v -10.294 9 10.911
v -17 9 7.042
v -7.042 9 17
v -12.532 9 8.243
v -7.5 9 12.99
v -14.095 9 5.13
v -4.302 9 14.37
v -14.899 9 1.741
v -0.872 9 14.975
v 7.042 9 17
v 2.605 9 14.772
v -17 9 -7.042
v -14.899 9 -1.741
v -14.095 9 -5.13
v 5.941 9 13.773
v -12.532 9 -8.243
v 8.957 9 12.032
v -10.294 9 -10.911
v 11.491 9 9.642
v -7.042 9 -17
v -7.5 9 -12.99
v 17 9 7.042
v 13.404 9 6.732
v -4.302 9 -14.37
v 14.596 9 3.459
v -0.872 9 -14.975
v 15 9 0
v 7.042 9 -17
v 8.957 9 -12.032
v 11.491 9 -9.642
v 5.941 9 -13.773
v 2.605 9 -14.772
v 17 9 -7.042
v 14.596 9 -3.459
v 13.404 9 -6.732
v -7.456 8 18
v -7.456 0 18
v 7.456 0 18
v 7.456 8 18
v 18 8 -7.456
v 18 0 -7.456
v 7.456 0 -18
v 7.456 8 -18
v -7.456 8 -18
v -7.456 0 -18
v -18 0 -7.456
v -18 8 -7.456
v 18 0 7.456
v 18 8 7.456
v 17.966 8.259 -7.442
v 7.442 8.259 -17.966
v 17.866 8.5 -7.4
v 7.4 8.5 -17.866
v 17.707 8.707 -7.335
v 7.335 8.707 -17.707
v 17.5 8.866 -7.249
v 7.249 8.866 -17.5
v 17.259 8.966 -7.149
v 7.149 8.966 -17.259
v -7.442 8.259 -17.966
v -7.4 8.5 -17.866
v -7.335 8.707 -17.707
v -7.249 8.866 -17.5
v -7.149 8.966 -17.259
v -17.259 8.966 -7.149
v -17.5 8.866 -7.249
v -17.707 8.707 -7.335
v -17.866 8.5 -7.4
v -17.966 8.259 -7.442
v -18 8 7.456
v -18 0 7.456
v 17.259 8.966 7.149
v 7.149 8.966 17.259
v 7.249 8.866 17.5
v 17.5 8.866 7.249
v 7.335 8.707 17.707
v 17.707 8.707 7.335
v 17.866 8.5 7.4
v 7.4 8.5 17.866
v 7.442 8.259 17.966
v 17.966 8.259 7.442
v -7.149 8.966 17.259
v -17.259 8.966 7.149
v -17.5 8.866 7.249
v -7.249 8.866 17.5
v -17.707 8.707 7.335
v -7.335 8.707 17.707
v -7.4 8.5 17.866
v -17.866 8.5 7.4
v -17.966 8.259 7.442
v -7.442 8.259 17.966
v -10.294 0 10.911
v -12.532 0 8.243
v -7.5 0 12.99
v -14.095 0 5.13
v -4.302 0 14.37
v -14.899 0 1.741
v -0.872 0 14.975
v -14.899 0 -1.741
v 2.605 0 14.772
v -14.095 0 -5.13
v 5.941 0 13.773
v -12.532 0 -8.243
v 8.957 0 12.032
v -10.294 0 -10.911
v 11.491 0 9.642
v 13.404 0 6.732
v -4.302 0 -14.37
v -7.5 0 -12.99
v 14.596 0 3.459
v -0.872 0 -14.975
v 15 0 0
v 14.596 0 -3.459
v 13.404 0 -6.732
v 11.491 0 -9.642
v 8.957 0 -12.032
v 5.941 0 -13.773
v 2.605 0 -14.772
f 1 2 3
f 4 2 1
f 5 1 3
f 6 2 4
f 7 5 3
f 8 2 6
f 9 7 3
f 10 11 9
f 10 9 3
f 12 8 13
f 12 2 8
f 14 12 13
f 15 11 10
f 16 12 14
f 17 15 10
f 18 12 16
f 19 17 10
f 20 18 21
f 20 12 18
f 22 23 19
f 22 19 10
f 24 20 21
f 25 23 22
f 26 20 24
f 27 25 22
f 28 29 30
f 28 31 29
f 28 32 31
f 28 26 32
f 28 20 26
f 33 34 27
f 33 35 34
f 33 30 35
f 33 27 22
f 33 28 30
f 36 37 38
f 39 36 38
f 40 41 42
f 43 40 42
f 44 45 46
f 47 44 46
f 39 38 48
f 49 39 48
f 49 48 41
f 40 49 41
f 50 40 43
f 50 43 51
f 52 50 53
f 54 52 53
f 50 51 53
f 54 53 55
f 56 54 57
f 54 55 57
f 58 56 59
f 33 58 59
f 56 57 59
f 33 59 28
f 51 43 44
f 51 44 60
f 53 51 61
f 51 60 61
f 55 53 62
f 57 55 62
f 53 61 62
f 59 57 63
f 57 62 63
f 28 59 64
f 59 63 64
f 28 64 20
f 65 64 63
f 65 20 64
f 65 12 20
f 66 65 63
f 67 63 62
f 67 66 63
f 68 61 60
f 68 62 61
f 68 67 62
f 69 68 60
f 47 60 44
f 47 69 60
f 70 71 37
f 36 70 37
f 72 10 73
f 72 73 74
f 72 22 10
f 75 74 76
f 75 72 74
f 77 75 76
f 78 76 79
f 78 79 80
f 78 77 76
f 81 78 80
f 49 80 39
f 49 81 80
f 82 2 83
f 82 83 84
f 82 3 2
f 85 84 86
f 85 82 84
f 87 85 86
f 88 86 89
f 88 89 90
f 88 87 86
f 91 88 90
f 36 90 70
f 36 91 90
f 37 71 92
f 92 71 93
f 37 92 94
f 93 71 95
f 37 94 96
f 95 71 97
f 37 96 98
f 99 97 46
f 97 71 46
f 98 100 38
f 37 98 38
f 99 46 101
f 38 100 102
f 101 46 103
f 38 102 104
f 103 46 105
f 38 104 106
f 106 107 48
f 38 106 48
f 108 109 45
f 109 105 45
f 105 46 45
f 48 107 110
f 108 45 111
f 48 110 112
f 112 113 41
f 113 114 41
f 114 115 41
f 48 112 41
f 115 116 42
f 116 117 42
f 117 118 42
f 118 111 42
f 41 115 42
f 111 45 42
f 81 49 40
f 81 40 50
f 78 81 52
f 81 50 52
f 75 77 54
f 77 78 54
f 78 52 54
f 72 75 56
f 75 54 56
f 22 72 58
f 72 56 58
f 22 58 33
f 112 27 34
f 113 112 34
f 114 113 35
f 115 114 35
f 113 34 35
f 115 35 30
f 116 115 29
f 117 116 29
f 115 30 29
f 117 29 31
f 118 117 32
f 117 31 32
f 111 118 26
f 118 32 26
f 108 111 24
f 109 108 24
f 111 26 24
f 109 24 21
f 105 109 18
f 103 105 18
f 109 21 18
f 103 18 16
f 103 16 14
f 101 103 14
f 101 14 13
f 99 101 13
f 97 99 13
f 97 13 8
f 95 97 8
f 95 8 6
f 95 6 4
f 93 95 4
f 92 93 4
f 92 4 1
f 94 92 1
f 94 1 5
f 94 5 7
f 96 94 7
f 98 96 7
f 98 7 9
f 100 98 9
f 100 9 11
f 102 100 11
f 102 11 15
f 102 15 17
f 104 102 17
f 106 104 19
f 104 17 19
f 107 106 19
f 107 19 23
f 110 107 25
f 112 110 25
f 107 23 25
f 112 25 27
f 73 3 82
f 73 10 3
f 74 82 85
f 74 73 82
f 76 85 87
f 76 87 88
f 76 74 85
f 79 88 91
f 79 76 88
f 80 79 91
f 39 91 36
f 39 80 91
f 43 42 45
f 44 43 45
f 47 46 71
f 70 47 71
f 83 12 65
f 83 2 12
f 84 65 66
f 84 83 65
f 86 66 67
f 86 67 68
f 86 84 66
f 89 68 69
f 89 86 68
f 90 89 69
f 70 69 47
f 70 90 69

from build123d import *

# Parameters (mm, degrees)
SALIENTE_EXTRUIR1_DEPTH = 9
CROQUIS2_R              = 15
CORTAR_EXTRUIR1_DEPTH   = 10
REDONDEO1_R             = 1


with BuildPart() as part:
    # Croquis1 → Saliente-Extruir1 (new body)
    with BuildSketch(Plane(origin=(0, 0, 0), x_dir=(1, 0, 0), z_dir=(0, 1, 0))):
        Polygon((18, 7.455844123), (7.455844123, 18), (-7.455844123, 18), (-18, 7.455844123), (-18, -7.455844123), (-7.455844123, -18), (7.455844123, -18), (18, -7.455844123), align=None)
    extrude(amount=SALIENTE_EXTRUIR1_DEPTH)

    # Croquis2 → Cortar-Extruir1 (cut, through all)
    with BuildSketch(Plane(origin=(0, 9, 0), x_dir=(1, 0, 0), z_dir=(0, 1, 0))):
        Circle(CROQUIS2_R)
    extrude(amount=-CORTAR_EXTRUIR1_DEPTH, mode=Mode.SUBTRACT)

    # Redondeo1
    redondeo1_edges = [part.edges().sort_by_distance(p)[0] for p in [
        (0, 9, -18),
        (-12.727922061, 9, -12.727922061),
        (-18, 9, 0),
        (-12.727922061, 9, 12.727922061),
        (0, 9, 18),
        (12.727922061, 9, 12.727922061),
        (18, 9, 0),
        (12.727922061, 9, -12.727922061),
    ]]
    fillet(redondeo1_edges, radius=REDONDEO1_R)


solid = part.part
